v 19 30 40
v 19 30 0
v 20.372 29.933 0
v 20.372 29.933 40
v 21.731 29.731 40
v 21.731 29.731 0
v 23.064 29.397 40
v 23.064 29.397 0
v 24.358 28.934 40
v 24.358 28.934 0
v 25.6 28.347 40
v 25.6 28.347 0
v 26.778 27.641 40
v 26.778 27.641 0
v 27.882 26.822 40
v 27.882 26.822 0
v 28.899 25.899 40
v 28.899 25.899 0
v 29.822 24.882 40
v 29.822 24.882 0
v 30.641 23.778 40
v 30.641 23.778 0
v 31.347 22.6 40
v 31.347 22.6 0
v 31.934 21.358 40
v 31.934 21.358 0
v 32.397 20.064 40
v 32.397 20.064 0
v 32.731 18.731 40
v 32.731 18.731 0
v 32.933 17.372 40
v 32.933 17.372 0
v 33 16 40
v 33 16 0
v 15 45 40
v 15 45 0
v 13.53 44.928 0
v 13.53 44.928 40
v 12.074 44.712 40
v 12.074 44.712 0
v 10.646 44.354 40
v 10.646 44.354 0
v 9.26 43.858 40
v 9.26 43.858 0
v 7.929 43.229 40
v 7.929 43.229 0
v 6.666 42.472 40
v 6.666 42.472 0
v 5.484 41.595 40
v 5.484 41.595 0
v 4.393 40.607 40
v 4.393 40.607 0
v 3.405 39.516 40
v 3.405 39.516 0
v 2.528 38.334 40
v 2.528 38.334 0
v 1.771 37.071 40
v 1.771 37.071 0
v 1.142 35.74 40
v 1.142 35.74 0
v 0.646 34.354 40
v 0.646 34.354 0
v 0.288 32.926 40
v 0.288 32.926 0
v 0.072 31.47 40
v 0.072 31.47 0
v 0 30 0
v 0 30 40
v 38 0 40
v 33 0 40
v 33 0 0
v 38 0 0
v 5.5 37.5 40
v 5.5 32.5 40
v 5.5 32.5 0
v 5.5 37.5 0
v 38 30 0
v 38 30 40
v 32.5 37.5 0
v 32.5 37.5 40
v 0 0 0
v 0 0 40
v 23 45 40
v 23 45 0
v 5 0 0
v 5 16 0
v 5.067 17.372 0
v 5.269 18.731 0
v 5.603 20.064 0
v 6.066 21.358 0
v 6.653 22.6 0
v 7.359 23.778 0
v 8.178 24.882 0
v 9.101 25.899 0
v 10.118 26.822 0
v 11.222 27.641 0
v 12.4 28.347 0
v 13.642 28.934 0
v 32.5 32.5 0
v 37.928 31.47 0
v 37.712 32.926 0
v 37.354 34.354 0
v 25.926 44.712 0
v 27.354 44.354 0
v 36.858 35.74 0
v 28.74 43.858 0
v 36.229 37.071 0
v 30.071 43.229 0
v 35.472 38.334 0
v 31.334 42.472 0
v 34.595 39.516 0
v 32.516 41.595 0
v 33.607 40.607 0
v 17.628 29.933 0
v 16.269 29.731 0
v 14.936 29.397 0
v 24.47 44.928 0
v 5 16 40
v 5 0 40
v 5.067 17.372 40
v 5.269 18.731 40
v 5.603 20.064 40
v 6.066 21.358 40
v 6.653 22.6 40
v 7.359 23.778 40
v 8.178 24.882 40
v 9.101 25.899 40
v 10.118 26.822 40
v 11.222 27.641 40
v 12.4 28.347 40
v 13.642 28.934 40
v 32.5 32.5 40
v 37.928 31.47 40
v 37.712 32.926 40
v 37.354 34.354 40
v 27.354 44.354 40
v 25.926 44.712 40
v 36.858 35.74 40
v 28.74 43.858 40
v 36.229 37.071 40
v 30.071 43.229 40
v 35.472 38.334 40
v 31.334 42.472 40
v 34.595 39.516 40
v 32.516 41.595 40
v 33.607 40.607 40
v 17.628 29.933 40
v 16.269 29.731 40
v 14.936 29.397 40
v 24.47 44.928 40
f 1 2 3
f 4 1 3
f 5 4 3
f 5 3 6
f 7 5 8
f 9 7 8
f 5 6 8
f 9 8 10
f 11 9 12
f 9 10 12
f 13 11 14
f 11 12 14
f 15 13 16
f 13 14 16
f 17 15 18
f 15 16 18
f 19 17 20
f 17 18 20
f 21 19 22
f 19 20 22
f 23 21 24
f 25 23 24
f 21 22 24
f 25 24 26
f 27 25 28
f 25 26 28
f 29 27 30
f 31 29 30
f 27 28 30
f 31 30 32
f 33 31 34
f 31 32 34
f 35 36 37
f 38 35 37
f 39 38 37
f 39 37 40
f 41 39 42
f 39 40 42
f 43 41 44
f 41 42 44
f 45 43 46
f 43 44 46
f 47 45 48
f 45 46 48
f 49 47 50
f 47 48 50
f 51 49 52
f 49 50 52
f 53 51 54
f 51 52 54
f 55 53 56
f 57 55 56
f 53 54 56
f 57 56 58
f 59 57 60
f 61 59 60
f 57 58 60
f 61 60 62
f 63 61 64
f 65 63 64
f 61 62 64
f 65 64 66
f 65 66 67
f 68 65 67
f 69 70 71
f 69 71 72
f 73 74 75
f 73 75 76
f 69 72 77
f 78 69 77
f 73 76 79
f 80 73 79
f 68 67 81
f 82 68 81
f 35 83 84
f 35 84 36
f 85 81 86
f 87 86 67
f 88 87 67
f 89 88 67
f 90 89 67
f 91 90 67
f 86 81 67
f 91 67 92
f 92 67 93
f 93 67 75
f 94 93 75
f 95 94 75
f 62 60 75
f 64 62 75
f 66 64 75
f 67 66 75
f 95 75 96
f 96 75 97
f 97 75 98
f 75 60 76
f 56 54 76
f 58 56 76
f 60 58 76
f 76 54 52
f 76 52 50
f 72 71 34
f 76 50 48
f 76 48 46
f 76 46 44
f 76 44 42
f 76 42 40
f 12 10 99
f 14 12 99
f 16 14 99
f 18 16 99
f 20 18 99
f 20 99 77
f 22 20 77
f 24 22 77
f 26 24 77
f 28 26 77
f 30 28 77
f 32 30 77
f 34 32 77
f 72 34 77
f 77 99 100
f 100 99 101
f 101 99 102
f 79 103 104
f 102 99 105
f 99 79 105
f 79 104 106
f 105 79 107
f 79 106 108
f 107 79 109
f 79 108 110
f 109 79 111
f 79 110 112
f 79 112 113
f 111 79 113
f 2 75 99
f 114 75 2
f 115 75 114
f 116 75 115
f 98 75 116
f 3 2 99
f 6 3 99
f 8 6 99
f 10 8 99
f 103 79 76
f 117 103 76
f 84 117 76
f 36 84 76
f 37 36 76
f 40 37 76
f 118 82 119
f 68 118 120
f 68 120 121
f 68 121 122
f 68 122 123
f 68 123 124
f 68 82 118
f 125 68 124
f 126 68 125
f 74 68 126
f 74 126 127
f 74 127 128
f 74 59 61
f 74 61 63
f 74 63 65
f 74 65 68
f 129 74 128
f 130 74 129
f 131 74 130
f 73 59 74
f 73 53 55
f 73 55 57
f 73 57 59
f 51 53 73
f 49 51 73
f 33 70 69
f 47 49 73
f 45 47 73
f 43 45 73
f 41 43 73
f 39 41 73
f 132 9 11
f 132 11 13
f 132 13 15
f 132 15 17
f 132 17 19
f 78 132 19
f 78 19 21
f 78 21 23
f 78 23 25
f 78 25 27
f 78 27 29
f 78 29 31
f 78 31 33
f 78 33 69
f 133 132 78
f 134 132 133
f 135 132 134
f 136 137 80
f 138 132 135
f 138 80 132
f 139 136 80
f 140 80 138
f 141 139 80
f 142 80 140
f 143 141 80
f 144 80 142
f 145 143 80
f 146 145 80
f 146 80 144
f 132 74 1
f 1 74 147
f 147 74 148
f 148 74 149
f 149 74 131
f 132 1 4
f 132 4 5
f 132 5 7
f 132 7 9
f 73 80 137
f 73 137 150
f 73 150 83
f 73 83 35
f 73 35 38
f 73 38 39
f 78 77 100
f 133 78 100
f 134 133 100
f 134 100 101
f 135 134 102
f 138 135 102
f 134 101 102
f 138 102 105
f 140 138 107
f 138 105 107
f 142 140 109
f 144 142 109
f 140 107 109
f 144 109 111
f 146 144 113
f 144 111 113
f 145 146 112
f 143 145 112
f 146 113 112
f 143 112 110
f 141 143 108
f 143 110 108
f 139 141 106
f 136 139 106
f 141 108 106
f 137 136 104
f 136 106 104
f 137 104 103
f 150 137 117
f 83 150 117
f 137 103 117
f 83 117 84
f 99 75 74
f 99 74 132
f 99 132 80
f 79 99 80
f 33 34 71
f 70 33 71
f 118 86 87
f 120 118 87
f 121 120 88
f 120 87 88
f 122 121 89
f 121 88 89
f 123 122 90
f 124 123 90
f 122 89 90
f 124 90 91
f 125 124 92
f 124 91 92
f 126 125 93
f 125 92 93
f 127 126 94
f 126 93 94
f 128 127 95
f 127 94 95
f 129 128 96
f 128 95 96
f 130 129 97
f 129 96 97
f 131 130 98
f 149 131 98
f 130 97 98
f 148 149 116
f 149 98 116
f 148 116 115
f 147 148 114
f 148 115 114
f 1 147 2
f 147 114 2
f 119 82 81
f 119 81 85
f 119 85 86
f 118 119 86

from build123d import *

# Parameters (mm, degrees)
F0_W     = 27
F0_H     = 5
F1_DEPTH = 40


with BuildPart() as f1:
    # F0 (on Top) → F1 (new body)
    with BuildSketch(Plane.XY):
        with BuildLine():
            Line((0, 30), (0, 0))
            Line((0, 0), (5, 0))
            Line((5, 0), (5, 16))
            ThreePointArc((5, 16), (9.100505, 25.899495), (19, 30))
            ThreePointArc((19, 30), (28.899495, 25.899495), (33, 16))
            Line((33, 16), (33, 0))
            Line((33, 0), (38, 0))
            Line((38, 0), (38, 30))
            ThreePointArc((38, 30), (33.606602, 40.606602), (23, 45))
            Line((23, 45), (15, 45))
            ThreePointArc((15, 45), (4.393398, 40.606602), (0, 30))
        make_face()
        with Locations((19, 35)):
            Rectangle(F0_W, F0_H, mode=Mode.SUBTRACT)
    extrude(amount=F1_DEPTH)


solid = f1.part
